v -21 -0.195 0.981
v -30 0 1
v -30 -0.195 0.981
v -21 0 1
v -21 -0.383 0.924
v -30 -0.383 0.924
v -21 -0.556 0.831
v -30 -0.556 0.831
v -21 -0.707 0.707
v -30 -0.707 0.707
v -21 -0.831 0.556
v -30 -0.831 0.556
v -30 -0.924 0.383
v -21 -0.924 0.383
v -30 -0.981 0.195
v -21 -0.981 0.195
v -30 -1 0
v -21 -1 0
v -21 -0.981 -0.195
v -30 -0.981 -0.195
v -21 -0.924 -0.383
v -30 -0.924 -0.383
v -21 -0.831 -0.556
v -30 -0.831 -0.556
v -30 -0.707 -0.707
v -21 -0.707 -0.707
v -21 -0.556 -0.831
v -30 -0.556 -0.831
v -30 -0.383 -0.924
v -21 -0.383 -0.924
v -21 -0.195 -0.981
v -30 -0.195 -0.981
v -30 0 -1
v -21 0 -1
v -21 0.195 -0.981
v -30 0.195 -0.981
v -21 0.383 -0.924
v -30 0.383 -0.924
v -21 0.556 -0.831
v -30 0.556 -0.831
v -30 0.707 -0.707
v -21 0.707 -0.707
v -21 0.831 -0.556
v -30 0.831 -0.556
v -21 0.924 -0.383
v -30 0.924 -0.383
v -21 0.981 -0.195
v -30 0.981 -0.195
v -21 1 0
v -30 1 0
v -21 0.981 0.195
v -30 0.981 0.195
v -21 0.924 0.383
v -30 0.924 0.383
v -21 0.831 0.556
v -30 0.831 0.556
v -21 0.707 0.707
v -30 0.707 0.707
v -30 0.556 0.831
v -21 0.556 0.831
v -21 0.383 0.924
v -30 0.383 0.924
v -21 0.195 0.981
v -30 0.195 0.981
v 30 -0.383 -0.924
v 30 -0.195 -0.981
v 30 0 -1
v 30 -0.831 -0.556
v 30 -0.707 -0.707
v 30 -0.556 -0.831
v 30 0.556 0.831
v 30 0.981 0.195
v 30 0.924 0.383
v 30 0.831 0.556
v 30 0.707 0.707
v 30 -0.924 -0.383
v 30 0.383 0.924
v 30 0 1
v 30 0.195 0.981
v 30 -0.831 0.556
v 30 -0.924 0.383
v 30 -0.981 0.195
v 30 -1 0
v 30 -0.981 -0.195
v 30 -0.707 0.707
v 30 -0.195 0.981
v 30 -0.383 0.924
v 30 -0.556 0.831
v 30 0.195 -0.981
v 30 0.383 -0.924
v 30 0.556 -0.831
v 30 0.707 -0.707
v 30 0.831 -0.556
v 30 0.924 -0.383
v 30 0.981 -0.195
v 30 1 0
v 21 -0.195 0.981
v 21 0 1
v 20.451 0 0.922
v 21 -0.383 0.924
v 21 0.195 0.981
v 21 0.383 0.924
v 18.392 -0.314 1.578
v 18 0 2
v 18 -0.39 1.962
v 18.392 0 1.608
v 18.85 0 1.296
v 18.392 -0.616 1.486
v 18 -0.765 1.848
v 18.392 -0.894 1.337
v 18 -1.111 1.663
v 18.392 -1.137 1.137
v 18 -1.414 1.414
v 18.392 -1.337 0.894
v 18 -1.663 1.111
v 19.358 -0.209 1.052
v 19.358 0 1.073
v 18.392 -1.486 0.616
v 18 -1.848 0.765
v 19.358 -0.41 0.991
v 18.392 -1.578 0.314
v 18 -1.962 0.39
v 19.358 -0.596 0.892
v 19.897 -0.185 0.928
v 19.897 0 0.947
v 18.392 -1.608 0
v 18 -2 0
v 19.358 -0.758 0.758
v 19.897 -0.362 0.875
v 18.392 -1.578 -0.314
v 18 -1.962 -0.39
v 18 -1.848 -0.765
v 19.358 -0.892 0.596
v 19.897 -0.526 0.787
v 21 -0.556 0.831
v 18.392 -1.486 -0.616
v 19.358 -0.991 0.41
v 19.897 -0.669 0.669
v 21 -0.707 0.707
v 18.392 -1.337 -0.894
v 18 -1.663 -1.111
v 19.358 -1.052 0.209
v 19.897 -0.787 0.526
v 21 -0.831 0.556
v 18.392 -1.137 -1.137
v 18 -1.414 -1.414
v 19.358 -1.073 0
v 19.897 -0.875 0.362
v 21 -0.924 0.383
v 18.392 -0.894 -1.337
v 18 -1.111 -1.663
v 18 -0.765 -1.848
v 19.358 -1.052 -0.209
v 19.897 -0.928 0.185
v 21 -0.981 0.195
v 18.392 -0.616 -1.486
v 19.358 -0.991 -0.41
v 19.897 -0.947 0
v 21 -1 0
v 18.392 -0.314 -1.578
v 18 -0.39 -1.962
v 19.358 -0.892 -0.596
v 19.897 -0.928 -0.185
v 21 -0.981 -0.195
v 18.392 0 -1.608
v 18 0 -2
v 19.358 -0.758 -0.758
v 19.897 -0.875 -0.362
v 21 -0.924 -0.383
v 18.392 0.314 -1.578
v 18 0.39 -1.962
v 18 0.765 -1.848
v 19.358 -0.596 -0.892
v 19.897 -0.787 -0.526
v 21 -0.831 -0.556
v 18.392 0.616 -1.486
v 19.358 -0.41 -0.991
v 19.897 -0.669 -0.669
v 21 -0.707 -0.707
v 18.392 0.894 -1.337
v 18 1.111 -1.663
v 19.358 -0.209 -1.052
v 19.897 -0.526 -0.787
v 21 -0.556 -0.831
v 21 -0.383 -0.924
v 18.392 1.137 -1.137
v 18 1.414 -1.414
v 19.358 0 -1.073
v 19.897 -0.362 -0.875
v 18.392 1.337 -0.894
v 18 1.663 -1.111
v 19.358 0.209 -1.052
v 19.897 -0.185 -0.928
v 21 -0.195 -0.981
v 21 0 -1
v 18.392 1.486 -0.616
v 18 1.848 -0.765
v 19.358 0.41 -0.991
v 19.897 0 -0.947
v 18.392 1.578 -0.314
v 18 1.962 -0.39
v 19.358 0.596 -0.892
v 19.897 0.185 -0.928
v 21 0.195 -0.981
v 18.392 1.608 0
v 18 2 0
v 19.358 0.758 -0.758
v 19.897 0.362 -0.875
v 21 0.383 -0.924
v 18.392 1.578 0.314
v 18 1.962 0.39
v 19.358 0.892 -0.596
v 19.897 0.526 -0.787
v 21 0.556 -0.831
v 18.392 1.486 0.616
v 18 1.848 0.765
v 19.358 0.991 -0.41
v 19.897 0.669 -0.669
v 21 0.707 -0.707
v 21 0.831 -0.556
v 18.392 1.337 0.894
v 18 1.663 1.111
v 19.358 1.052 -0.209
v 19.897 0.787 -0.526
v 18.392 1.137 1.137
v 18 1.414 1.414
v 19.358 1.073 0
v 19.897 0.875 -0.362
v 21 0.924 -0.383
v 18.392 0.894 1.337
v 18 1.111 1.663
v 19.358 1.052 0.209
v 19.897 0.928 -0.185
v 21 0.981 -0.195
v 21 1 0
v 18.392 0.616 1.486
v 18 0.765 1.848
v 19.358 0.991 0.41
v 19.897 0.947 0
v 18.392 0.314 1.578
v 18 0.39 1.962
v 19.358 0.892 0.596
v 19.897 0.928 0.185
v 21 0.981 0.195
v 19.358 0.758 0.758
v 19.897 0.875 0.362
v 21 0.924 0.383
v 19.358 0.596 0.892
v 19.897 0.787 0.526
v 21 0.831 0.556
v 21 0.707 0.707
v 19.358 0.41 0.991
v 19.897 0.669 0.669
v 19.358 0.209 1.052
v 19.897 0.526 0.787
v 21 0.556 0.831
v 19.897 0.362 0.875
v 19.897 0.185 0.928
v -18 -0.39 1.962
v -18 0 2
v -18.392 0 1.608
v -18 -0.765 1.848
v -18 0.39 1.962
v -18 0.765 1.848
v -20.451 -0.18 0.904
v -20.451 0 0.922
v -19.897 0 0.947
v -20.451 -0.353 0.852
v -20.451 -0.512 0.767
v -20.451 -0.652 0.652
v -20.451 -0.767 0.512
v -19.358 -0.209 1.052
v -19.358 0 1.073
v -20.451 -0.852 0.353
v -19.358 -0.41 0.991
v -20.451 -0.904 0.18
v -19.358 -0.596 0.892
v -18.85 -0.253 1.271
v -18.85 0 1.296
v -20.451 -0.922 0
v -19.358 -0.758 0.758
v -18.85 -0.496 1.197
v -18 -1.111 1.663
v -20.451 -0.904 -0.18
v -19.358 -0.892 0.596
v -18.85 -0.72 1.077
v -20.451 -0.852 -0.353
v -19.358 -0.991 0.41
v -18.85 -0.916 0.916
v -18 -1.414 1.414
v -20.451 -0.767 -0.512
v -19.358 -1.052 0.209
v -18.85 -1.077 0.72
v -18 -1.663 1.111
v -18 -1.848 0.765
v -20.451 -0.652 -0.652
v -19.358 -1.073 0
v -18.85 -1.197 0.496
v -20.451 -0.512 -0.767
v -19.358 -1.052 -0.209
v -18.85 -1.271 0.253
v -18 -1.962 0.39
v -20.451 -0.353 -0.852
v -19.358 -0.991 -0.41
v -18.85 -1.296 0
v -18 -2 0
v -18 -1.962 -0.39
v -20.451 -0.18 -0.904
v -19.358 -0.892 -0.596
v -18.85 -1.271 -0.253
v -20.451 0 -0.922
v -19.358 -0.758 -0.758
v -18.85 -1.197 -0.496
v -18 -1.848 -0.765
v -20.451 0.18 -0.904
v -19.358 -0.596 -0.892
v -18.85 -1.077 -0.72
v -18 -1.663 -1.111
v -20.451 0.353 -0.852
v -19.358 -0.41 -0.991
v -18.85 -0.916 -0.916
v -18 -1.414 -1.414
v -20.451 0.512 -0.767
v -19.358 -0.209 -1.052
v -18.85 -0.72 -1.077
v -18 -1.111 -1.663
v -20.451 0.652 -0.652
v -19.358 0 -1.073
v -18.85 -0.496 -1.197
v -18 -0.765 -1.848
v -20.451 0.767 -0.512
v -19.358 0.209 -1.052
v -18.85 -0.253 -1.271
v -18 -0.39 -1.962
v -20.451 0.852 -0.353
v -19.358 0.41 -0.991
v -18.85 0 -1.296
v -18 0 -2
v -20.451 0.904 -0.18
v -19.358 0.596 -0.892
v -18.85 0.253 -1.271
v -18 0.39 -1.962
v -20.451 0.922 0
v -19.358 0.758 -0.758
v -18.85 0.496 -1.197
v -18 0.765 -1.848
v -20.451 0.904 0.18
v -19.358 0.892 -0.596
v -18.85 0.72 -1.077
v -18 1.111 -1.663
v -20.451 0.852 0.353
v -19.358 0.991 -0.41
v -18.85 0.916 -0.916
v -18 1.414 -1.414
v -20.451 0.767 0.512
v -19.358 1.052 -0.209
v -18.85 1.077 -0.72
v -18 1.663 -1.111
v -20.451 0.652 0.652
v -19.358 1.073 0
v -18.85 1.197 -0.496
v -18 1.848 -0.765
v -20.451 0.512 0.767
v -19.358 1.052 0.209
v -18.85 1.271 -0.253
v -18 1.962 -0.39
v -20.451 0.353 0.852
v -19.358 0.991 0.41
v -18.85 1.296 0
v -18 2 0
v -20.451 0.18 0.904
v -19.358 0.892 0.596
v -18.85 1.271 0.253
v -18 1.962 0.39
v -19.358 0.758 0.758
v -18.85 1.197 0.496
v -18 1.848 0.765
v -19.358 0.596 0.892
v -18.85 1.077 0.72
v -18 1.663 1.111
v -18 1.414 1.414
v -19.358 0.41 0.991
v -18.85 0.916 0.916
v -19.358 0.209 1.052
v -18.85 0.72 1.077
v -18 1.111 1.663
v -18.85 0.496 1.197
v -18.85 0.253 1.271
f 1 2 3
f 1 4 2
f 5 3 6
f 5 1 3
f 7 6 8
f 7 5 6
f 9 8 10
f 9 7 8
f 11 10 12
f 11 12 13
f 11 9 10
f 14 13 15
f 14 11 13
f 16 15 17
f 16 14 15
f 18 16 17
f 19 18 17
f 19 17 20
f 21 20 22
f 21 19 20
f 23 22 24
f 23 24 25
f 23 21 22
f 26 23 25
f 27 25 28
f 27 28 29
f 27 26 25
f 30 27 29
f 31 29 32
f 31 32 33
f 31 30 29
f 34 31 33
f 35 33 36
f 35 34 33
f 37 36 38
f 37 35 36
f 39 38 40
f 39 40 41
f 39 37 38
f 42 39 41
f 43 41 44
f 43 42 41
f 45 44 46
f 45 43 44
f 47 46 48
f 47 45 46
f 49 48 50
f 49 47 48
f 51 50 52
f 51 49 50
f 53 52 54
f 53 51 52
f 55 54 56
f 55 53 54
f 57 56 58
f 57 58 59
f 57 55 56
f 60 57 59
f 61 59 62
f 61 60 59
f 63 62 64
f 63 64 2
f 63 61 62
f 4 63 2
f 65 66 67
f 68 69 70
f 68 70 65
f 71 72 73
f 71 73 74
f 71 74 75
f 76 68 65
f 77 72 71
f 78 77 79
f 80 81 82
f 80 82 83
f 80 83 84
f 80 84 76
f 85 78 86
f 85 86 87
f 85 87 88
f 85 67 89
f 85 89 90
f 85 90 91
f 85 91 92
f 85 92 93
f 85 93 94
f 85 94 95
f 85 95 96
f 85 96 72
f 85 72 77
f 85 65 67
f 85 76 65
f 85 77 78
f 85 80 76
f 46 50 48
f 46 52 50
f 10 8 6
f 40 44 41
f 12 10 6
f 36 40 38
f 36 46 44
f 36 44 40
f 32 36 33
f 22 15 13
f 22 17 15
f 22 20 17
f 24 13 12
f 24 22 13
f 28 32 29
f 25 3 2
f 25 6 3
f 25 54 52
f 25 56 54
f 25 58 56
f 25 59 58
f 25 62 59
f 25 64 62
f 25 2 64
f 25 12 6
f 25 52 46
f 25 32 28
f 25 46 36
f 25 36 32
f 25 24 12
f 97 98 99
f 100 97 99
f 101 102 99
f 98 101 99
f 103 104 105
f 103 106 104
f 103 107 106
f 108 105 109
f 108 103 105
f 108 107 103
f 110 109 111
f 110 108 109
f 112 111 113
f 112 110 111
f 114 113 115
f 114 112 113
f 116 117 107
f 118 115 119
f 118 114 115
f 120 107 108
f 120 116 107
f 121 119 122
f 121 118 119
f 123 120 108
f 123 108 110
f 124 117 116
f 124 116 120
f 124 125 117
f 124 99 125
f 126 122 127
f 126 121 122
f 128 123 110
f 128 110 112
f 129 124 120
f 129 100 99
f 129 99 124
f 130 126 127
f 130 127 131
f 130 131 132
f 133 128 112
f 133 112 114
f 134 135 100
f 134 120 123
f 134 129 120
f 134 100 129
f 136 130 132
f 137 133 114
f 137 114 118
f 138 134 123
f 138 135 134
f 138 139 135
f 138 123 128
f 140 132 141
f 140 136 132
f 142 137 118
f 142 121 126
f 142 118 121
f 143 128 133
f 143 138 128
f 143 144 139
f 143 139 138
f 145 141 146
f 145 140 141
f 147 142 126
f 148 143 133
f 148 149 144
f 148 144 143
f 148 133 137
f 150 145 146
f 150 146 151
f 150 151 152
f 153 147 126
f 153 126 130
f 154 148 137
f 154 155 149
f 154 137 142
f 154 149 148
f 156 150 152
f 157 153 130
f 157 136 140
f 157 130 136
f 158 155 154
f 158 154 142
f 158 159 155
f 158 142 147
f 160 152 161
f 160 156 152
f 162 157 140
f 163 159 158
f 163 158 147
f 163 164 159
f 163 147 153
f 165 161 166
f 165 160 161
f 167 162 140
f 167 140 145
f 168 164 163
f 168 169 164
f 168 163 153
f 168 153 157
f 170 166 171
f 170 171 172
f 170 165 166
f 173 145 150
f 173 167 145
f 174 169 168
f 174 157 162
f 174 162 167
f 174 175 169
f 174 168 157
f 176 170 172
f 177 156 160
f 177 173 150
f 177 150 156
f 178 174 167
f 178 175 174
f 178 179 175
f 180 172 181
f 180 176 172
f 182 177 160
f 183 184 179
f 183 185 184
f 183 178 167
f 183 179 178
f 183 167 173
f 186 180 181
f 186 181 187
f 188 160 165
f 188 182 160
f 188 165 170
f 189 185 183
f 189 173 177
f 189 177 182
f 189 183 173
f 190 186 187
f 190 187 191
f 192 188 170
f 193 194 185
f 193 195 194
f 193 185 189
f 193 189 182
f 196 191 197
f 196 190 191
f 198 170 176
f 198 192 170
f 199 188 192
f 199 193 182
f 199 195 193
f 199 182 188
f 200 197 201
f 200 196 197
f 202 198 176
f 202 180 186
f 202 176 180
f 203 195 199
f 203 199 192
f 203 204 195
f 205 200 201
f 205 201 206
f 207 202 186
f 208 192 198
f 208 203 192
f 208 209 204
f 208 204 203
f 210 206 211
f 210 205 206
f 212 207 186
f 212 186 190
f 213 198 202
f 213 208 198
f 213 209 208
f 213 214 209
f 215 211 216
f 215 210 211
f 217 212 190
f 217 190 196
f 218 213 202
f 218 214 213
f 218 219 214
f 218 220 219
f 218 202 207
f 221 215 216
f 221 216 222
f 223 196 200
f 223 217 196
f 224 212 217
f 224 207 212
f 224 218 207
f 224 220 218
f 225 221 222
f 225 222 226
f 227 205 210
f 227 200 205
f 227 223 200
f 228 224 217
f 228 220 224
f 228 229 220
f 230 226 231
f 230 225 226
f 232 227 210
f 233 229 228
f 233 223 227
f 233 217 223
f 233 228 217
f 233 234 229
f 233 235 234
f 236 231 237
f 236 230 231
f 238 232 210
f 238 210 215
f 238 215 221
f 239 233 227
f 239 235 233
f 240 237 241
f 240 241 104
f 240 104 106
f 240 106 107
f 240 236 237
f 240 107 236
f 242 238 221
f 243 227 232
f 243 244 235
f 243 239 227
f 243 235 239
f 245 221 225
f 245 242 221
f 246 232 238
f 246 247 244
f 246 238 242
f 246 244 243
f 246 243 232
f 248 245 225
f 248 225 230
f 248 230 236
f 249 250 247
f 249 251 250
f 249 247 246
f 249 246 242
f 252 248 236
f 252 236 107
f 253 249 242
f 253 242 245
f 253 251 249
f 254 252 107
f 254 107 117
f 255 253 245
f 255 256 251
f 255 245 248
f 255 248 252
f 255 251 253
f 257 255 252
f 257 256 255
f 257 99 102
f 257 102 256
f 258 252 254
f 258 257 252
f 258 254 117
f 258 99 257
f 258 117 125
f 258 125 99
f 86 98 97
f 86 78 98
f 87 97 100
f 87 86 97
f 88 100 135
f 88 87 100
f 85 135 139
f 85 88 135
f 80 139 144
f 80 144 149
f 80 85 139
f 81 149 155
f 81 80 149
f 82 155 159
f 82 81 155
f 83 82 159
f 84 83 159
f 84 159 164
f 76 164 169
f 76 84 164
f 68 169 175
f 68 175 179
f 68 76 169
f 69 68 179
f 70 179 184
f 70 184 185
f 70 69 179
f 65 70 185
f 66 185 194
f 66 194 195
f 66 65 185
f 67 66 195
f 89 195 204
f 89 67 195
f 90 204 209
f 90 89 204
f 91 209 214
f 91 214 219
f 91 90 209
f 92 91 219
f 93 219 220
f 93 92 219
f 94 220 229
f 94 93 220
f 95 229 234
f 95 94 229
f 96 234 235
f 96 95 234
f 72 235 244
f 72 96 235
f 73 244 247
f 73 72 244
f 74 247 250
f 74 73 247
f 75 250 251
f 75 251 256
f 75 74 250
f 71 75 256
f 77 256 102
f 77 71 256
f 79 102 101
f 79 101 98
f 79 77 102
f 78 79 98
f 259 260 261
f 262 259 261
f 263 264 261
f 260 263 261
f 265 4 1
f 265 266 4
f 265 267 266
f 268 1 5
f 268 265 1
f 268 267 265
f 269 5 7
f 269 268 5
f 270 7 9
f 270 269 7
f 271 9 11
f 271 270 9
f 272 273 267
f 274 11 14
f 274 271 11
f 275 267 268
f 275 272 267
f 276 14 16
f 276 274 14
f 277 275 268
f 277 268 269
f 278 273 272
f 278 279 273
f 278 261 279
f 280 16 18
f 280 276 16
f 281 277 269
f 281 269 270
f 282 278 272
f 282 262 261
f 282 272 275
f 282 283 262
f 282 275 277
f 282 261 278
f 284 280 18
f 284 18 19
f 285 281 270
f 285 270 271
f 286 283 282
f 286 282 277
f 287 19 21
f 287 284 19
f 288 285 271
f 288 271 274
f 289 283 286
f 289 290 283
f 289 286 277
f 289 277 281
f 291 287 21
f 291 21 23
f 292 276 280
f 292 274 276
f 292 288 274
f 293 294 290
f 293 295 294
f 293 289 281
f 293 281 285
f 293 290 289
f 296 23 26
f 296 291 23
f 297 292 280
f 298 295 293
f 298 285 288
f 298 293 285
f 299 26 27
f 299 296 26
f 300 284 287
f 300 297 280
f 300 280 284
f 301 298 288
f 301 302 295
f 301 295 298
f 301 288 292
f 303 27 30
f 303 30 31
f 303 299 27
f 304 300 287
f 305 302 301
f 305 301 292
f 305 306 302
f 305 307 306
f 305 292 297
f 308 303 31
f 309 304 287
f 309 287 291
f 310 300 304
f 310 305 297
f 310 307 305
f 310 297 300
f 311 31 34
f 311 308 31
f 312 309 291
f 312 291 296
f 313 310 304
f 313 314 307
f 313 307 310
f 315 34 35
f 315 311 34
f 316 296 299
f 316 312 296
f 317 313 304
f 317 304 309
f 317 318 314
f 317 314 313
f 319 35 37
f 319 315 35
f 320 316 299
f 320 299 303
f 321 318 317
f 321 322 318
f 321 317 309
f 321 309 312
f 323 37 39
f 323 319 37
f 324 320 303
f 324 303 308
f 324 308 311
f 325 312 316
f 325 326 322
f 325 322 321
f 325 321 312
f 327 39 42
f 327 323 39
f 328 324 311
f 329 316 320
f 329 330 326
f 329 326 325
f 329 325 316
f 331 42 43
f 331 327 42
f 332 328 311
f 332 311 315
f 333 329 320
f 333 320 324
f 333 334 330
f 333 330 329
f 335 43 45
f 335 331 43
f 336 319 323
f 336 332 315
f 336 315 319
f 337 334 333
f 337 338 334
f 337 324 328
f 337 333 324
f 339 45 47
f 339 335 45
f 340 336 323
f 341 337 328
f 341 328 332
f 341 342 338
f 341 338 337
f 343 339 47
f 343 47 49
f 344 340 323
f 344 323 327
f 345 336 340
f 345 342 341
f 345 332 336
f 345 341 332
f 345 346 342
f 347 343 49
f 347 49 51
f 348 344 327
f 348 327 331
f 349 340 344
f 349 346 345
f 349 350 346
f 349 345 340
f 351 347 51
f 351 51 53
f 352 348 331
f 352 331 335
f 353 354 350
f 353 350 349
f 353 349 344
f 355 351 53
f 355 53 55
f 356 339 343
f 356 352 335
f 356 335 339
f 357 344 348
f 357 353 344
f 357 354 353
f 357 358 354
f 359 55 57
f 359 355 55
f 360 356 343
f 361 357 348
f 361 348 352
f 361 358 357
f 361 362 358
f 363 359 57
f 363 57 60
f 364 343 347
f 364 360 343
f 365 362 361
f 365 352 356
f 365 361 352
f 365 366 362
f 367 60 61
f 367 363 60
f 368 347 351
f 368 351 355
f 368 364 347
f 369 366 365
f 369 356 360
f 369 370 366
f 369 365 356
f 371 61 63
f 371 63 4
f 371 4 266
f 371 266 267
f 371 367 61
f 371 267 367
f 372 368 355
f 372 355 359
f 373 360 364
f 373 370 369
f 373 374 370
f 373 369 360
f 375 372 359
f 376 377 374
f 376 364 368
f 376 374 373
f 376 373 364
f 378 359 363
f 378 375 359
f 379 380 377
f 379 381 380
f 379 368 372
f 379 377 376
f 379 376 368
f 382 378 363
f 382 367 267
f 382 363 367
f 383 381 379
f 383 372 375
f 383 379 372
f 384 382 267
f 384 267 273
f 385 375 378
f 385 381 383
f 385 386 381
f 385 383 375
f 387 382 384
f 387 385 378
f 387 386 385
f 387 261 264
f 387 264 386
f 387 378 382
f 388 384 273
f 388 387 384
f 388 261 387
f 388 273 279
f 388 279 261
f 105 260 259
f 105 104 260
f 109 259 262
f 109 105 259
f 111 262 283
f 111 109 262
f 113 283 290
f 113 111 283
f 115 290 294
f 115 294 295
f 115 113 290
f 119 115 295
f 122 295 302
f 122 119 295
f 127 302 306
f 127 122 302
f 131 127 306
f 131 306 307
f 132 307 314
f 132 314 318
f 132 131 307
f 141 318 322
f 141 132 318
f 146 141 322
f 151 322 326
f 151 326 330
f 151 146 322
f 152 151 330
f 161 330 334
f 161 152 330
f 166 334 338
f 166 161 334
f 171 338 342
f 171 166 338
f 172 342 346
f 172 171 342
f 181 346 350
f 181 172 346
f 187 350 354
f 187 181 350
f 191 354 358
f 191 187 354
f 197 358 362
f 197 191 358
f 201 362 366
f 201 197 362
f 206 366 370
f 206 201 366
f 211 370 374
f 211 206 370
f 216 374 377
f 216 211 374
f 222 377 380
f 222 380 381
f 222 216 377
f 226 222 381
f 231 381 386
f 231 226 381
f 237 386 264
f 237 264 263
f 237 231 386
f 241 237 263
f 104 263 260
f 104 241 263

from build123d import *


with BuildPart() as part:
    # Sketch4 → Revolve1 (revolve)
    with BuildSketch(Plane(origin=(0, 0, 0), x_dir=(1, 0, 0), z_dir=(0, 1, 0)), mode=Mode.PRIVATE) as revolve1_sk:
        with BuildLine():
            Line((-18, 2), (18, 2))
            ThreePointArc((18, 2), (19.357542477, 1.07262743), (21, 1))
            Line((21, 1), (30, 1))
            Line((30, 1), (30, 0))
            Line((30, 0), (-30, 0))
            Line((-30, 0), (-30, 1))
            Line((-30, 1), (-21, 1))
            ThreePointArc((-21, 1), (-19.357542477, 1.07262743), (-18, 2))
        make_face()
    revolve(revolve1_sk.sketch.rotate(Axis((-30, 0, 0), (1, 0, 0)), 180), axis=Axis((-30, 0, 0), (1, 0, 0)))


solid = part.part
